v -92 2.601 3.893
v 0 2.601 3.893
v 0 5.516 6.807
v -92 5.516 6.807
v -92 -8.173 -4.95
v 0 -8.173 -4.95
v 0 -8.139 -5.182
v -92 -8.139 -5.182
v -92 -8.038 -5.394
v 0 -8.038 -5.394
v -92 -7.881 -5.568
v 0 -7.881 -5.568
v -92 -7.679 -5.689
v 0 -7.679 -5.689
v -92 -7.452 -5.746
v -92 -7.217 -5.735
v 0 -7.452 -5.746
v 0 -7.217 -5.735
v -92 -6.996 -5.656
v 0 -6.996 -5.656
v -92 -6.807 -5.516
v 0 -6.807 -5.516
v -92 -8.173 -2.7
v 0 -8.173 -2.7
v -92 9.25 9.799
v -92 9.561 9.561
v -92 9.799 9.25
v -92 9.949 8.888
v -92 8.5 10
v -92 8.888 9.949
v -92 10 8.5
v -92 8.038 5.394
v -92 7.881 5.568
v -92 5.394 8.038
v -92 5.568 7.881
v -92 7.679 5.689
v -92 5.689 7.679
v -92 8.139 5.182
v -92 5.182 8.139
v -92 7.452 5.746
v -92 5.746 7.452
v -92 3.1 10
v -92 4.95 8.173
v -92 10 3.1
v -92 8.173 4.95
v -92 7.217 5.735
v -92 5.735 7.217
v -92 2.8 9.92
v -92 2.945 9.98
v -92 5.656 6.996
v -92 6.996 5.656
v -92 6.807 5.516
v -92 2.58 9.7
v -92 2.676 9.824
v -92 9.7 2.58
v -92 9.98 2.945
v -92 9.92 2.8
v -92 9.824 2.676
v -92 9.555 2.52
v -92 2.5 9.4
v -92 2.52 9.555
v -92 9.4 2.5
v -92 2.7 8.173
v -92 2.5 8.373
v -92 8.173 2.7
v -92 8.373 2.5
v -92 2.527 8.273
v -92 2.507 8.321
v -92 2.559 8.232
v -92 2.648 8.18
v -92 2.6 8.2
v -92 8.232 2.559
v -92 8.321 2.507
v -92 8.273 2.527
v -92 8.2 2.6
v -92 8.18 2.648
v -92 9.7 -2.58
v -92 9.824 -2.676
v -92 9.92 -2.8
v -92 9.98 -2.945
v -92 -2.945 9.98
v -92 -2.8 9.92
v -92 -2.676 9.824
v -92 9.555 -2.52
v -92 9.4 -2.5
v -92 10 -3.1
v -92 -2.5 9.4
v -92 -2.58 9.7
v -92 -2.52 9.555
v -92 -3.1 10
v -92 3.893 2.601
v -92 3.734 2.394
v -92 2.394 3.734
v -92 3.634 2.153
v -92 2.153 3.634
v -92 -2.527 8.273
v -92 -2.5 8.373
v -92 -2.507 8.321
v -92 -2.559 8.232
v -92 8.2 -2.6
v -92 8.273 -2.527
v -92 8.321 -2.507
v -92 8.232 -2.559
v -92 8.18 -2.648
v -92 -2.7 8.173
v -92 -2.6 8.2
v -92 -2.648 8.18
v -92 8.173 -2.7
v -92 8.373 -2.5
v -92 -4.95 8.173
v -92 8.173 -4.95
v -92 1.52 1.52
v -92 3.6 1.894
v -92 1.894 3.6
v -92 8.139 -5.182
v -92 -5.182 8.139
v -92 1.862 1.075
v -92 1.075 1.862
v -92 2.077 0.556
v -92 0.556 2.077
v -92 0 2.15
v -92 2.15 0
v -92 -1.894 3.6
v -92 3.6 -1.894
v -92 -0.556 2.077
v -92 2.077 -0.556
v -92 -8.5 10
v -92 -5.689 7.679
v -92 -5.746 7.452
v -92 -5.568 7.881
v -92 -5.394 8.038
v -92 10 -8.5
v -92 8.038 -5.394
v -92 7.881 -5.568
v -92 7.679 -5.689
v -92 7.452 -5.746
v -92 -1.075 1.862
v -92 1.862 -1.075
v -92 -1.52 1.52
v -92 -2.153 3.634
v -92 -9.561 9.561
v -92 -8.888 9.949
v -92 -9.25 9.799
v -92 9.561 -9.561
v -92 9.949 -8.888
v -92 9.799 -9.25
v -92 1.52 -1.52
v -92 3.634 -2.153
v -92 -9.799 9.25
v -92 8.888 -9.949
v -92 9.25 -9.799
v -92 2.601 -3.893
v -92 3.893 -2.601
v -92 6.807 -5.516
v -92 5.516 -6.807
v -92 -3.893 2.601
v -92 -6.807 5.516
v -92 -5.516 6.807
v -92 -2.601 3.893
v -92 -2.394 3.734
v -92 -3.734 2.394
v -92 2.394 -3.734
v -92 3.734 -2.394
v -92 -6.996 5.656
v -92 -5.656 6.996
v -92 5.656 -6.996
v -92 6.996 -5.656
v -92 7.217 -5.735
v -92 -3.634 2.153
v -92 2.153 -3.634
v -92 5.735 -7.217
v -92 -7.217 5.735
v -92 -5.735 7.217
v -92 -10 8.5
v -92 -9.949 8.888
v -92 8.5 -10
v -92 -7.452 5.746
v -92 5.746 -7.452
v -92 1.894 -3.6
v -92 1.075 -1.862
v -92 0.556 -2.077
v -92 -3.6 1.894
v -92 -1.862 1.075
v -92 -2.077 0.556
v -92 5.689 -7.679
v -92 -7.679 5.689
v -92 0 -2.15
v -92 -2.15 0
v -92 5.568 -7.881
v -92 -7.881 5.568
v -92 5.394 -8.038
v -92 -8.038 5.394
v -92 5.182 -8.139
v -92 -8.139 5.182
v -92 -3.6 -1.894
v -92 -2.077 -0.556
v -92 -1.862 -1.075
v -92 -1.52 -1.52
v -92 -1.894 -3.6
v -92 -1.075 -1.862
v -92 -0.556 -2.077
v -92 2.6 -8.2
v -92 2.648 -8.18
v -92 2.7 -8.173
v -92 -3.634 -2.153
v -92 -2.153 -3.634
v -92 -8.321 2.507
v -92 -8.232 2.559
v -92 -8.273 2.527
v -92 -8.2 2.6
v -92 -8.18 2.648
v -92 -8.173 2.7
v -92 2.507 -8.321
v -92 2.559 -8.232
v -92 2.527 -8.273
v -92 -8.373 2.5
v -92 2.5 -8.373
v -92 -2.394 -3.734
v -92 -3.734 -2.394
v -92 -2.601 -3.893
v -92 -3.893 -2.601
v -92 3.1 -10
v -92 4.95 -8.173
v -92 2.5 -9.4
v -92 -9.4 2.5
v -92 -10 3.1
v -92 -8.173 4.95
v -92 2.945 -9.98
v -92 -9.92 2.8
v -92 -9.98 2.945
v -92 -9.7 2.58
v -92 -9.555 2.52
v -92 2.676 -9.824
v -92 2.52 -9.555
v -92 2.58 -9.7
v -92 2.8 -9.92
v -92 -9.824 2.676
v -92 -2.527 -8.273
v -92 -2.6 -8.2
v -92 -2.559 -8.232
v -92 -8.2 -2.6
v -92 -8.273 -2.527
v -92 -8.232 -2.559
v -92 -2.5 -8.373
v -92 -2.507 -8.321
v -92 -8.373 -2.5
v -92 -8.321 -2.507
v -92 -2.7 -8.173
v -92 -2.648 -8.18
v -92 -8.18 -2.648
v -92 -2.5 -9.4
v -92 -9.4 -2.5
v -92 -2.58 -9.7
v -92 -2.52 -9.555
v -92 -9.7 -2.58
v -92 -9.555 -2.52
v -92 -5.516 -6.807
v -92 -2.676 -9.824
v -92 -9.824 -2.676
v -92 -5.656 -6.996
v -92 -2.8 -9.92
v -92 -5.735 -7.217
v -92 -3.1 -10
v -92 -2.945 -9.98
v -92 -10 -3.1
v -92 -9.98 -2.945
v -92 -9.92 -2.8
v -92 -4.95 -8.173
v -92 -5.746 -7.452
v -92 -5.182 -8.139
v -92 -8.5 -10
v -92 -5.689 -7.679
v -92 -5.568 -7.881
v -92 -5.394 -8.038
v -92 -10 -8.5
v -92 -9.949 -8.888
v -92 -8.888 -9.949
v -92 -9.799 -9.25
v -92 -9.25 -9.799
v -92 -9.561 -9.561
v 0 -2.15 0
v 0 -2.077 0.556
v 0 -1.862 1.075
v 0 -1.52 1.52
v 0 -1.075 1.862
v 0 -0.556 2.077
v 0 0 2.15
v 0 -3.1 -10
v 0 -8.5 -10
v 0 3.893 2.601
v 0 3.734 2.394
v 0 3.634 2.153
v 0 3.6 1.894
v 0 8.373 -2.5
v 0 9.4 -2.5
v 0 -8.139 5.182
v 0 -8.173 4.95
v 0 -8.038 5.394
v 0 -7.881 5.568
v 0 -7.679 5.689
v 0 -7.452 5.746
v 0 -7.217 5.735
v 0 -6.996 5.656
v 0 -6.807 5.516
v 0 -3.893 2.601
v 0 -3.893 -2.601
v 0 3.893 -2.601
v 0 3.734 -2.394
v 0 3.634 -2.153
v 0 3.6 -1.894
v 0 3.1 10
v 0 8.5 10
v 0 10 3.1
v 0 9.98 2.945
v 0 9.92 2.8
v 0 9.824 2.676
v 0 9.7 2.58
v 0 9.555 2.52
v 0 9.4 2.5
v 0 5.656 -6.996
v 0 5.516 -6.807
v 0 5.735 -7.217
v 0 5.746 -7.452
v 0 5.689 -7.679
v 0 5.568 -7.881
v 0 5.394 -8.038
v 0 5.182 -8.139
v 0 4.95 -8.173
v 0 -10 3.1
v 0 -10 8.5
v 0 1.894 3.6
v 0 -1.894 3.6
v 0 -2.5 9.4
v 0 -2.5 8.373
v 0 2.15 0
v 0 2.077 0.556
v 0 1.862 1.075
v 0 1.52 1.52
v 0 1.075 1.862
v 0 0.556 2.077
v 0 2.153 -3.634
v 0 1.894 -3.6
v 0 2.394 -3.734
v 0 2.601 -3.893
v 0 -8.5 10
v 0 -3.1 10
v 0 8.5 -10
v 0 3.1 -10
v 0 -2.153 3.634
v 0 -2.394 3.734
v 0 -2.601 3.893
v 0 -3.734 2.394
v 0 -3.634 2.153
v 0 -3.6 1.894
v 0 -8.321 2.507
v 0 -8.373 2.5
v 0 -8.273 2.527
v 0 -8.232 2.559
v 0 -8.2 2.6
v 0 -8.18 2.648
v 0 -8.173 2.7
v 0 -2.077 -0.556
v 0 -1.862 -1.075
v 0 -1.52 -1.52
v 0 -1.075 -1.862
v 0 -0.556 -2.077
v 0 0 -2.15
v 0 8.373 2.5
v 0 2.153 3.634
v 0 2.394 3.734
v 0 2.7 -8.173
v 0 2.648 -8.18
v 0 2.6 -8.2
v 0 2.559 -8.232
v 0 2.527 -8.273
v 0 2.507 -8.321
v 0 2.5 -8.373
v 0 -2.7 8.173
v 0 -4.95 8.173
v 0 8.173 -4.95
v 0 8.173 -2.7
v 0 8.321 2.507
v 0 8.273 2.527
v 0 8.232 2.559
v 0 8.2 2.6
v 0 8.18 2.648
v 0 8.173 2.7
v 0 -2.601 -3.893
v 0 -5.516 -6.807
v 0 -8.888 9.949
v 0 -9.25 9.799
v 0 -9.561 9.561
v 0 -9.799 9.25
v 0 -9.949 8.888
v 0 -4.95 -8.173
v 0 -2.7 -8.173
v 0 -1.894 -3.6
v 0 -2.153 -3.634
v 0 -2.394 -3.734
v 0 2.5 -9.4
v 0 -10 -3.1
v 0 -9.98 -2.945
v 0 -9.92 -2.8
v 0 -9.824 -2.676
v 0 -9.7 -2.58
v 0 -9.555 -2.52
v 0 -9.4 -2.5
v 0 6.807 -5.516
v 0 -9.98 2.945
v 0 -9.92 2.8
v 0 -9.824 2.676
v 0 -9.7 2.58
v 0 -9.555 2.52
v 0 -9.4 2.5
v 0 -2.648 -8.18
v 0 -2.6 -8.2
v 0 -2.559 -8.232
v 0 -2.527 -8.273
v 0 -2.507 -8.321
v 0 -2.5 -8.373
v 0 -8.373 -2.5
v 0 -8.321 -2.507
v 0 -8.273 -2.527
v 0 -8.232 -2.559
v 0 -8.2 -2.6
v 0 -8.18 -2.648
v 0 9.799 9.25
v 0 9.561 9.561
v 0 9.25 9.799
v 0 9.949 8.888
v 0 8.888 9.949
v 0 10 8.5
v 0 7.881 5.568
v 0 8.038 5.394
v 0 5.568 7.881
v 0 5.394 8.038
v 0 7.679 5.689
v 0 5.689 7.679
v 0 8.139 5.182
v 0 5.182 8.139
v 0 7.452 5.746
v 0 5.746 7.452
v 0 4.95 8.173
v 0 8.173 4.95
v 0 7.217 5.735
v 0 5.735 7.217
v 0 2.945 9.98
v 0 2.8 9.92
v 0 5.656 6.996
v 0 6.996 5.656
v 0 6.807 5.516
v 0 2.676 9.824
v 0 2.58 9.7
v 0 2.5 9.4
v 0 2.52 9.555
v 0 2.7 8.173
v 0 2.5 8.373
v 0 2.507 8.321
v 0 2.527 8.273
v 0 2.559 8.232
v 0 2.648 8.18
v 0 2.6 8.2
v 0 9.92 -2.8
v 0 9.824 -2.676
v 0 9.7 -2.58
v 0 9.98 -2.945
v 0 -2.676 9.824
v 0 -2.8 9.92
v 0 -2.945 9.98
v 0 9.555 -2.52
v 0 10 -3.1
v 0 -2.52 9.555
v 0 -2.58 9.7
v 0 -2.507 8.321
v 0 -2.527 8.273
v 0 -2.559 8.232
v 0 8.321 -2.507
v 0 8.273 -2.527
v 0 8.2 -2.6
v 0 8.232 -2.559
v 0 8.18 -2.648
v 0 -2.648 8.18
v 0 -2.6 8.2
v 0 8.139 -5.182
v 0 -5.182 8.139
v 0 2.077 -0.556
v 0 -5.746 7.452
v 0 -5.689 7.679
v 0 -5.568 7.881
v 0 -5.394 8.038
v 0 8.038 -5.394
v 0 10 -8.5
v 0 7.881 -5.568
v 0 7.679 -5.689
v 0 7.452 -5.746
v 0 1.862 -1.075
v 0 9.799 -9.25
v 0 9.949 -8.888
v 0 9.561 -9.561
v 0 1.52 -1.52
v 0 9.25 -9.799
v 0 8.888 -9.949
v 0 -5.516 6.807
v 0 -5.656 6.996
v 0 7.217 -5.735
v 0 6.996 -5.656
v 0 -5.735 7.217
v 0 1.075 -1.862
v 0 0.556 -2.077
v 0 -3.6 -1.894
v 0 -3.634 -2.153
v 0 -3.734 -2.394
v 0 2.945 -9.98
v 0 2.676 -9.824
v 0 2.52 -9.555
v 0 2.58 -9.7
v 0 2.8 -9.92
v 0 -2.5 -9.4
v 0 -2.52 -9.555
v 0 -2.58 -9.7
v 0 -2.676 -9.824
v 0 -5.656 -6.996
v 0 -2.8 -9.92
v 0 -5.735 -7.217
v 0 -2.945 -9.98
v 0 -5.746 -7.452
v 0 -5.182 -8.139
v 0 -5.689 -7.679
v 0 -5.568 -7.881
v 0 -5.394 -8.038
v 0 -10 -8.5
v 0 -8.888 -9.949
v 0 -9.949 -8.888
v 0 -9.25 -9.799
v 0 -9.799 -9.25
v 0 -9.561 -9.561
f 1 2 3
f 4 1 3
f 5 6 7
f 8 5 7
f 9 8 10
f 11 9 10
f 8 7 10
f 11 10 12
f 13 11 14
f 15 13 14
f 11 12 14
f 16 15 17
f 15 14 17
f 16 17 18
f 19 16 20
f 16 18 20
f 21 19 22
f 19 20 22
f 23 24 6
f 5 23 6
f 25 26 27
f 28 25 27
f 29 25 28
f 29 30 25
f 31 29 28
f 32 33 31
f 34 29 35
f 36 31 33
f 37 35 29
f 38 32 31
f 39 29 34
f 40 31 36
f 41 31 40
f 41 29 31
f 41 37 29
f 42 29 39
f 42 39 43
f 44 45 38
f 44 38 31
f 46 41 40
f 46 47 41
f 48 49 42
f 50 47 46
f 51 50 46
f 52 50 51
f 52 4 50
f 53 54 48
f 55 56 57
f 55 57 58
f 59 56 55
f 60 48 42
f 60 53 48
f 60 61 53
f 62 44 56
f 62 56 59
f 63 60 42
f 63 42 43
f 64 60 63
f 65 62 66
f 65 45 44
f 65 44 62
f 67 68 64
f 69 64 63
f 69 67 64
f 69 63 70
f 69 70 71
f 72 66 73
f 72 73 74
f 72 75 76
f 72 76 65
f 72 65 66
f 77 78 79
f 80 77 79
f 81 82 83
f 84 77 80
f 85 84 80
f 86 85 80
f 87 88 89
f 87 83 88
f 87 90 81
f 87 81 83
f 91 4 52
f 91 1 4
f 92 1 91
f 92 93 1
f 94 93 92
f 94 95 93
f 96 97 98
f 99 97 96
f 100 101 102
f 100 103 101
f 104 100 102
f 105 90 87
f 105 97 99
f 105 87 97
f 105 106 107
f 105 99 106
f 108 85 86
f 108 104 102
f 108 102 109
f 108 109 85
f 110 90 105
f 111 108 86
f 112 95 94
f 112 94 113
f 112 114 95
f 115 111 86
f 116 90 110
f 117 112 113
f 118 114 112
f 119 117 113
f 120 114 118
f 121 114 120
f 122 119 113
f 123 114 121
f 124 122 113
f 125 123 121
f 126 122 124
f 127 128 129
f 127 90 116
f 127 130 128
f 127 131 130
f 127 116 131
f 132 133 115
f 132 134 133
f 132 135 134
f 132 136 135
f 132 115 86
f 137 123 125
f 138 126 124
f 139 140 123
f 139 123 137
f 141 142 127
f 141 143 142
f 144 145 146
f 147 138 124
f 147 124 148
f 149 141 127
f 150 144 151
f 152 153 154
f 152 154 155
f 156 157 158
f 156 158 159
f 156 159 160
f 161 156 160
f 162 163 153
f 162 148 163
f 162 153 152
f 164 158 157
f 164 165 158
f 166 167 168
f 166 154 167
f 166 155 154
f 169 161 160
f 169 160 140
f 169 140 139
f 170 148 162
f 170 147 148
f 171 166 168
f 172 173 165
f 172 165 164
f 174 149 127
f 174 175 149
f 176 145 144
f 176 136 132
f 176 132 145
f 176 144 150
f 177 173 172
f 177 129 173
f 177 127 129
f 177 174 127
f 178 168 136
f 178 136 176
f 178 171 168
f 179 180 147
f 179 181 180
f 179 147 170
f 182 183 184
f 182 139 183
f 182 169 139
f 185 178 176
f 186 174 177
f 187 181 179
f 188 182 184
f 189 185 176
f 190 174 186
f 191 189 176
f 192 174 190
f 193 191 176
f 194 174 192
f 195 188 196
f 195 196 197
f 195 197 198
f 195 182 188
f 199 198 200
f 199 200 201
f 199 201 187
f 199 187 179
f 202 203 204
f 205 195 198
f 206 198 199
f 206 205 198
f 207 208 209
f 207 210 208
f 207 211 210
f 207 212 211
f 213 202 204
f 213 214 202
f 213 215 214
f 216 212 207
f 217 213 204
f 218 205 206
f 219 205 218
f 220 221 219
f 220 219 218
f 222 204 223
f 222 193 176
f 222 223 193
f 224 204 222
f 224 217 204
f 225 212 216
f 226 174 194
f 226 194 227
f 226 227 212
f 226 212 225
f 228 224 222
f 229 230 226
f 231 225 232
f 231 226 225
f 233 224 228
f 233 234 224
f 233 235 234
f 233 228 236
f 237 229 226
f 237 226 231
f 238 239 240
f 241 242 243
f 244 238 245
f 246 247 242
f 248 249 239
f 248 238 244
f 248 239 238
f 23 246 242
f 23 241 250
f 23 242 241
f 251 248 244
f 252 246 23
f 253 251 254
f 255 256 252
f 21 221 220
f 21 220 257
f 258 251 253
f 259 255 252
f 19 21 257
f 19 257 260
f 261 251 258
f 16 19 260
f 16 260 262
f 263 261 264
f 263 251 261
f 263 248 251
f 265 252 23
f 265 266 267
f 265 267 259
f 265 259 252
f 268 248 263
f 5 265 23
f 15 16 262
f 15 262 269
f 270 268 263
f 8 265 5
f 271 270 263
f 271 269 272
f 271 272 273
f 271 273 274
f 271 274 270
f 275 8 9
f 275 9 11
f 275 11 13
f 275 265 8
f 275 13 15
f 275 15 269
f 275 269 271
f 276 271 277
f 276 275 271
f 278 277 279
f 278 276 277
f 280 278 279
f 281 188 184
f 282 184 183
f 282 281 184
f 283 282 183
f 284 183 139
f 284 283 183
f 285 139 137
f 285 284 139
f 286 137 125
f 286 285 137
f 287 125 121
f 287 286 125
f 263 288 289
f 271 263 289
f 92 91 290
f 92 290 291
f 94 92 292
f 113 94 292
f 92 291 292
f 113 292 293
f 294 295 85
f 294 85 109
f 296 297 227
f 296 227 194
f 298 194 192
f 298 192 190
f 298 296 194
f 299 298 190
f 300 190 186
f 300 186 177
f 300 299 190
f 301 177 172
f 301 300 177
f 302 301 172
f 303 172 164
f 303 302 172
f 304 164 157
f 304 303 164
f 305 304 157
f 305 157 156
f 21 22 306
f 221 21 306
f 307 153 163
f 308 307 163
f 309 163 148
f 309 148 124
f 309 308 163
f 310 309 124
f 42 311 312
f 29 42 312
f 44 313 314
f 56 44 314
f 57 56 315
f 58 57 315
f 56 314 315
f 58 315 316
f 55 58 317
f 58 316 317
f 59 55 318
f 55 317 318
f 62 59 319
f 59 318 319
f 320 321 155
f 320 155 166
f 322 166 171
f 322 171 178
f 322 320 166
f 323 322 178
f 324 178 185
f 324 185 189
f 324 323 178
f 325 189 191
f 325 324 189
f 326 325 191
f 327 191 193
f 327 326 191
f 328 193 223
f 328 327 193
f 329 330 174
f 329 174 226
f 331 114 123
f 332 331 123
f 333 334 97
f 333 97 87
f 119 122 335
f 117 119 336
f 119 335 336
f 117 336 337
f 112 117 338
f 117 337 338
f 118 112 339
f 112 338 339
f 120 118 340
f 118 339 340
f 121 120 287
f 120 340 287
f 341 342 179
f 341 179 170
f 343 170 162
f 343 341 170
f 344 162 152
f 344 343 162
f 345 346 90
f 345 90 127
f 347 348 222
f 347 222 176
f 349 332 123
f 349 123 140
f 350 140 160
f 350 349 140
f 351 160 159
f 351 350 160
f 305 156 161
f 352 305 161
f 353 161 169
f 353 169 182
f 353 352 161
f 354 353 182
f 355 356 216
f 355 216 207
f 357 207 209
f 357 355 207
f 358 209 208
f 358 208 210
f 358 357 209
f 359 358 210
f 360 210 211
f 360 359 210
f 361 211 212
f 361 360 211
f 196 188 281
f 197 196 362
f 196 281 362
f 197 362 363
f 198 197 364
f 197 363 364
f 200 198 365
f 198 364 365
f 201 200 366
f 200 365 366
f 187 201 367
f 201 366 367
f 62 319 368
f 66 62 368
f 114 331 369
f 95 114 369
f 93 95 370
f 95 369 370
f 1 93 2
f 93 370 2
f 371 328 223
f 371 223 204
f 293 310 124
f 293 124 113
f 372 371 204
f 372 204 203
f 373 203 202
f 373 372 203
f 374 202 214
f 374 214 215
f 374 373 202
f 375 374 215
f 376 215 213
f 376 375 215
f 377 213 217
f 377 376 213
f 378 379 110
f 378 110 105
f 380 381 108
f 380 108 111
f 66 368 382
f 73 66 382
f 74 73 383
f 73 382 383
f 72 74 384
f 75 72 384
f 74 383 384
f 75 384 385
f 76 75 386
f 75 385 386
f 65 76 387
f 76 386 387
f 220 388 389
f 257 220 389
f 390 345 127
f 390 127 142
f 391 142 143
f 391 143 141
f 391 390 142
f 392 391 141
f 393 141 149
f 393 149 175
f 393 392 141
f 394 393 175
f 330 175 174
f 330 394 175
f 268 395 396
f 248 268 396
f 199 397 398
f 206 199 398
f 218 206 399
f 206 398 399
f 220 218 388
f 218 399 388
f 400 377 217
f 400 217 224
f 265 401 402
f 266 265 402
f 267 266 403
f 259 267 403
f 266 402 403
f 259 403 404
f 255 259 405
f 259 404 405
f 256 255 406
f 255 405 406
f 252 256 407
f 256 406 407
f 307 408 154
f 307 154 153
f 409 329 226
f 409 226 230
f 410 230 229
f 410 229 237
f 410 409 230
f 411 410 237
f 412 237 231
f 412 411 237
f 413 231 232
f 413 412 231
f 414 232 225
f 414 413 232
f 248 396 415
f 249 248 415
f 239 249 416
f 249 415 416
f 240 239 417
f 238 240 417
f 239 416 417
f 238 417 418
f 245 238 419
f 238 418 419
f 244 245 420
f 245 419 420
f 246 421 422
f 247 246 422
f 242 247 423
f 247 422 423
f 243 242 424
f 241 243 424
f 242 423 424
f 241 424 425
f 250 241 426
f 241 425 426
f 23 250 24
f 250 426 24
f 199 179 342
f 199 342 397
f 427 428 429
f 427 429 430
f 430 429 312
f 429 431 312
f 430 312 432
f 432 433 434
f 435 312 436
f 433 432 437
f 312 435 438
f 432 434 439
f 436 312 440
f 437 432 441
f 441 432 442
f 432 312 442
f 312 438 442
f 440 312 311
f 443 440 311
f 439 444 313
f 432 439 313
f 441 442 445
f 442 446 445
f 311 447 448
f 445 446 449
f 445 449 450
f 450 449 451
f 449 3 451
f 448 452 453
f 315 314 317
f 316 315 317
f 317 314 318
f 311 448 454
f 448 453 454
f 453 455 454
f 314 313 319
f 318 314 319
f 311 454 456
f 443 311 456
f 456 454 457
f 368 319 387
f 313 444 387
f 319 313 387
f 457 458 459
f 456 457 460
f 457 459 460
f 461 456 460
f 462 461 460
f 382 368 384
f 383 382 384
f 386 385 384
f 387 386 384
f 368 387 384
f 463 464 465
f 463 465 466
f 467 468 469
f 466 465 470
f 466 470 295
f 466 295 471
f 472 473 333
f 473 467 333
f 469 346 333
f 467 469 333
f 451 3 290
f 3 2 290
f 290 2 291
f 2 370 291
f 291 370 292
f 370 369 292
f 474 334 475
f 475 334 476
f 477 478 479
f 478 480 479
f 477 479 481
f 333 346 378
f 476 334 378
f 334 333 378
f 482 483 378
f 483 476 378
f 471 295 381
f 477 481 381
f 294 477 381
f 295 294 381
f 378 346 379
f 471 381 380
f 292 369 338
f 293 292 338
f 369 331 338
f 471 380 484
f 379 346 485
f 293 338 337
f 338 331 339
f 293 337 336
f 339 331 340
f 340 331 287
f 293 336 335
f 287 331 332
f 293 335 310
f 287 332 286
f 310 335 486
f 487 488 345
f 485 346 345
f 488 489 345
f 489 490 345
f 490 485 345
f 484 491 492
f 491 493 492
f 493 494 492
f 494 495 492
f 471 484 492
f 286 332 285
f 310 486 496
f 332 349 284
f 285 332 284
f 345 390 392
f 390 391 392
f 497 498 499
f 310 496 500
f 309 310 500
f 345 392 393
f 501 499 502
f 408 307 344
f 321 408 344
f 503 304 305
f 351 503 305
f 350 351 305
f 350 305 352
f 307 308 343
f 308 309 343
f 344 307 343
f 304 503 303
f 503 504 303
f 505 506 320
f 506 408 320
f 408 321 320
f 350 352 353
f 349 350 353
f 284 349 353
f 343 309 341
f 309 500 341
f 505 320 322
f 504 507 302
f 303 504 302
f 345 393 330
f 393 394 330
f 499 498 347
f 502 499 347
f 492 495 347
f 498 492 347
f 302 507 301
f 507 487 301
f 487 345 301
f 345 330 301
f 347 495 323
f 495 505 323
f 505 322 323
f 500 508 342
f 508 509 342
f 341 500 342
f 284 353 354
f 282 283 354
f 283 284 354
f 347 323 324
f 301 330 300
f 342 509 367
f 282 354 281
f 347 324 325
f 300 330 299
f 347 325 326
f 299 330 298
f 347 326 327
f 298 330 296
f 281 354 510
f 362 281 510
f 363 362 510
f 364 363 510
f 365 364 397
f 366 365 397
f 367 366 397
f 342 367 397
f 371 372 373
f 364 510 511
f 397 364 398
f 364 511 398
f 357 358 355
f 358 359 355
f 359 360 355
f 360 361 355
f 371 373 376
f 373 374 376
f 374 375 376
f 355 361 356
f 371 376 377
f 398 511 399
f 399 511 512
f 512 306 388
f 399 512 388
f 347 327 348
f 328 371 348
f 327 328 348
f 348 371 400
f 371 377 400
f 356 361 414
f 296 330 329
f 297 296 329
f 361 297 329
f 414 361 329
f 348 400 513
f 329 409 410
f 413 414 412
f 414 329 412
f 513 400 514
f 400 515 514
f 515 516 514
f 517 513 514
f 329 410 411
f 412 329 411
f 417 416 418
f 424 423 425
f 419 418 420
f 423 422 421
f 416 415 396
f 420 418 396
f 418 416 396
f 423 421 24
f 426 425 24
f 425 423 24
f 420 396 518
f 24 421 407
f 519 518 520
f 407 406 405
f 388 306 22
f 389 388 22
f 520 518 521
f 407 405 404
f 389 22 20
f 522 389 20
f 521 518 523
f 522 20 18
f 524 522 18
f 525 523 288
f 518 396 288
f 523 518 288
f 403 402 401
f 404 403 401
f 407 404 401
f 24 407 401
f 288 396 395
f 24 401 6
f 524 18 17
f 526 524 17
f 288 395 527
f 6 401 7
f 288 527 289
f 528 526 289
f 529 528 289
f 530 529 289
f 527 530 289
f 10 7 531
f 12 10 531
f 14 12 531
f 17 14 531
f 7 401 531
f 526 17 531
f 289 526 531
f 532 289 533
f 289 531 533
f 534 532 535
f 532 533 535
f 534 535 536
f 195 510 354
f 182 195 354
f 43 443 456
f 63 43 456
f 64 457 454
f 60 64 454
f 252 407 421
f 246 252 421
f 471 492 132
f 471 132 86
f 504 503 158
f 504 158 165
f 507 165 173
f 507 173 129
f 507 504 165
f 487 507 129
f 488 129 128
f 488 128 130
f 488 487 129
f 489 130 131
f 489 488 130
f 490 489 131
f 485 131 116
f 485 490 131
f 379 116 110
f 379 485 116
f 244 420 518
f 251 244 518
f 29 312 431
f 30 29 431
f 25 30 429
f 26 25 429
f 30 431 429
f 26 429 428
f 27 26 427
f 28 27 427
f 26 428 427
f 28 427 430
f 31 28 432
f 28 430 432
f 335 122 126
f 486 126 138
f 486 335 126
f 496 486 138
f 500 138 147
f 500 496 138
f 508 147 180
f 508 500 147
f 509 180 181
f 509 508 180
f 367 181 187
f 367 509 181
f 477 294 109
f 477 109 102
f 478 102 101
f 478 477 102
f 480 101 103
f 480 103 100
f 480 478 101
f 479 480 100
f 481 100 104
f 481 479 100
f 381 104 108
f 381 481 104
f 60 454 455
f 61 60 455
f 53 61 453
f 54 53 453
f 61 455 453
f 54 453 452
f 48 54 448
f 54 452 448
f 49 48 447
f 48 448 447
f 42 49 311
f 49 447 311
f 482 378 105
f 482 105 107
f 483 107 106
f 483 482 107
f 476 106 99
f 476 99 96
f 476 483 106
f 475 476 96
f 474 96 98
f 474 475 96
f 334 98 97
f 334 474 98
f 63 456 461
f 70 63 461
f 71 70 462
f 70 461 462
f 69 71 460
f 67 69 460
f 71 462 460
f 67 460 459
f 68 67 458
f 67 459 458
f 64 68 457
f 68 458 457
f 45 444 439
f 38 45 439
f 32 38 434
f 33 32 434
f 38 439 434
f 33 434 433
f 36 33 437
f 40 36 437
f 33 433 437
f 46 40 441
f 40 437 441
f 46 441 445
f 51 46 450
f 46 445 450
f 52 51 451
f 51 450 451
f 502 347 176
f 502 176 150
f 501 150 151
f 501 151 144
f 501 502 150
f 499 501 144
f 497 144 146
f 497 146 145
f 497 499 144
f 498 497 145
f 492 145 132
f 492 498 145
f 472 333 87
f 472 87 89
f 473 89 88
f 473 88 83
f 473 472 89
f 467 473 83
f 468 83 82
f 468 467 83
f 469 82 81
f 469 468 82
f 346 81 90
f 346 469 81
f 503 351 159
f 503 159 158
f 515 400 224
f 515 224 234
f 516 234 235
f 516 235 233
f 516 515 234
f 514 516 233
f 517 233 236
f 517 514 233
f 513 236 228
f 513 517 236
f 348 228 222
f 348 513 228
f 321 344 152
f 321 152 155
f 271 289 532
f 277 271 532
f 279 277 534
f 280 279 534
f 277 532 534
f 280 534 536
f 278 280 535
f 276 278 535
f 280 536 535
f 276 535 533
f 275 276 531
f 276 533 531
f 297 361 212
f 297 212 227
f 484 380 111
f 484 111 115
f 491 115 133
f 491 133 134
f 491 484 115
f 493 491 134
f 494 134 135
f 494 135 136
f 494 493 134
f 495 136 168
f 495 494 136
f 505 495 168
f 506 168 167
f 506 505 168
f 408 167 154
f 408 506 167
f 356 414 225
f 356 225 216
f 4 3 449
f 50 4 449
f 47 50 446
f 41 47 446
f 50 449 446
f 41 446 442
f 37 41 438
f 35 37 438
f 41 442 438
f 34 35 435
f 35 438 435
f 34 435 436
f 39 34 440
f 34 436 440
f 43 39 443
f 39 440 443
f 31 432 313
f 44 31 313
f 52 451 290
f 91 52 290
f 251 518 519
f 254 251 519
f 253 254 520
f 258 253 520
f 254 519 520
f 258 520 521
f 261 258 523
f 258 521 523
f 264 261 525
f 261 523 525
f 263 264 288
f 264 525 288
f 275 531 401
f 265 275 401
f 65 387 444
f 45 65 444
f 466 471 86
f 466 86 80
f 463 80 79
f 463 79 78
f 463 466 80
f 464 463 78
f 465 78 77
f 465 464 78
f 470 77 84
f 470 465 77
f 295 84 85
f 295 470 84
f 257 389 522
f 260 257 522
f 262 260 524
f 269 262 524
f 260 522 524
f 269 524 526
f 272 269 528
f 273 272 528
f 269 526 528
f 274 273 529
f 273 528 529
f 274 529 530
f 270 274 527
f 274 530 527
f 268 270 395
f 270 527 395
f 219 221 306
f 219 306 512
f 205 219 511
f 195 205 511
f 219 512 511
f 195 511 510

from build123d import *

# Parameters (mm, degrees)
BOSS_EXTRUDE1_DEPTH = 92


with BuildPart() as part:
    # Sketch3 → Boss-Extrude1 (new body)
    with BuildSketch(Plane(origin=(0, 0, 0), x_dir=(0, 0, -1), z_dir=(1, 0, 0))):
        with BuildLine():
            Line((-5.515685425, 6.807463915), (-2.601114729, 3.892893219))
            ThreePointArc((-2.601114729, 3.892893219), (-2.27669138, 3.676120467), (-1.894007948, 3.6))
            Line((-1.894007948, 3.6), (0, 3.6))
            Line((0, 3.6), (0, 2.15))
            ThreePointArc((0, 2.15), (-1.52027958, 1.52027958), (-2.15, 0))
            Line((-2.15, 0), (-3.6, 0))
            Line((-3.6, 0), (-3.6, 1.894007948))
            ThreePointArc((-3.6, 1.894007948), (-3.676120467, 2.27669138), (-3.892893219, 2.601114729))
            Line((-3.892893219, 2.601114729), (-6.807463915, 5.515685425))
            ThreePointArc((-6.807463915, 5.515685425), (-7.679296086, 5.689103626), (-8.17314934, 4.95))
            Line((-8.17314934, 4.95), (-8.17314934, 2.7))
            ThreePointArc((-8.17314934, 2.7), (-8.231727984, 2.558578644), (-8.37314934, 2.5))
            Line((-8.37314934, 2.5), (-9.4, 2.5))
            ThreePointArc((-9.4, 2.5), (-9.824264069, 2.675735931), (-10, 3.1))
            Line((-10, 3.1), (-10, 8.5))
            ThreePointArc((-10, 8.5), (-9.560660172, 9.560660172), (-8.5, 10))
            Line((-8.5, 10), (-3.1, 10))
            ThreePointArc((-3.1, 10), (-2.675735931, 9.824264069), (-2.5, 9.4))
            Line((-2.5, 9.4), (-2.5, 8.37314934))
            ThreePointArc((-2.5, 8.37314934), (-2.558578644, 8.231727984), (-2.7, 8.17314934))
            Line((-2.7, 8.17314934), (-4.95, 8.17314934))
            ThreePointArc((-4.95, 8.17314934), (-5.689103626, 7.679296086), (-5.515685425, 6.807463915))
        make_face()
    extrude(amount=-BOSS_EXTRUDE1_DEPTH)

    # Mirror1: part across plane


with BuildPart() as part_1:
    add(part.part)
    add(part.part.mirror(Plane.ZX))

    # Mirror2: part across plane


with BuildPart() as part_2:
    add(part_1.part)
    add(part_1.part.mirror(Plane.XY))


solid = part_2.part
